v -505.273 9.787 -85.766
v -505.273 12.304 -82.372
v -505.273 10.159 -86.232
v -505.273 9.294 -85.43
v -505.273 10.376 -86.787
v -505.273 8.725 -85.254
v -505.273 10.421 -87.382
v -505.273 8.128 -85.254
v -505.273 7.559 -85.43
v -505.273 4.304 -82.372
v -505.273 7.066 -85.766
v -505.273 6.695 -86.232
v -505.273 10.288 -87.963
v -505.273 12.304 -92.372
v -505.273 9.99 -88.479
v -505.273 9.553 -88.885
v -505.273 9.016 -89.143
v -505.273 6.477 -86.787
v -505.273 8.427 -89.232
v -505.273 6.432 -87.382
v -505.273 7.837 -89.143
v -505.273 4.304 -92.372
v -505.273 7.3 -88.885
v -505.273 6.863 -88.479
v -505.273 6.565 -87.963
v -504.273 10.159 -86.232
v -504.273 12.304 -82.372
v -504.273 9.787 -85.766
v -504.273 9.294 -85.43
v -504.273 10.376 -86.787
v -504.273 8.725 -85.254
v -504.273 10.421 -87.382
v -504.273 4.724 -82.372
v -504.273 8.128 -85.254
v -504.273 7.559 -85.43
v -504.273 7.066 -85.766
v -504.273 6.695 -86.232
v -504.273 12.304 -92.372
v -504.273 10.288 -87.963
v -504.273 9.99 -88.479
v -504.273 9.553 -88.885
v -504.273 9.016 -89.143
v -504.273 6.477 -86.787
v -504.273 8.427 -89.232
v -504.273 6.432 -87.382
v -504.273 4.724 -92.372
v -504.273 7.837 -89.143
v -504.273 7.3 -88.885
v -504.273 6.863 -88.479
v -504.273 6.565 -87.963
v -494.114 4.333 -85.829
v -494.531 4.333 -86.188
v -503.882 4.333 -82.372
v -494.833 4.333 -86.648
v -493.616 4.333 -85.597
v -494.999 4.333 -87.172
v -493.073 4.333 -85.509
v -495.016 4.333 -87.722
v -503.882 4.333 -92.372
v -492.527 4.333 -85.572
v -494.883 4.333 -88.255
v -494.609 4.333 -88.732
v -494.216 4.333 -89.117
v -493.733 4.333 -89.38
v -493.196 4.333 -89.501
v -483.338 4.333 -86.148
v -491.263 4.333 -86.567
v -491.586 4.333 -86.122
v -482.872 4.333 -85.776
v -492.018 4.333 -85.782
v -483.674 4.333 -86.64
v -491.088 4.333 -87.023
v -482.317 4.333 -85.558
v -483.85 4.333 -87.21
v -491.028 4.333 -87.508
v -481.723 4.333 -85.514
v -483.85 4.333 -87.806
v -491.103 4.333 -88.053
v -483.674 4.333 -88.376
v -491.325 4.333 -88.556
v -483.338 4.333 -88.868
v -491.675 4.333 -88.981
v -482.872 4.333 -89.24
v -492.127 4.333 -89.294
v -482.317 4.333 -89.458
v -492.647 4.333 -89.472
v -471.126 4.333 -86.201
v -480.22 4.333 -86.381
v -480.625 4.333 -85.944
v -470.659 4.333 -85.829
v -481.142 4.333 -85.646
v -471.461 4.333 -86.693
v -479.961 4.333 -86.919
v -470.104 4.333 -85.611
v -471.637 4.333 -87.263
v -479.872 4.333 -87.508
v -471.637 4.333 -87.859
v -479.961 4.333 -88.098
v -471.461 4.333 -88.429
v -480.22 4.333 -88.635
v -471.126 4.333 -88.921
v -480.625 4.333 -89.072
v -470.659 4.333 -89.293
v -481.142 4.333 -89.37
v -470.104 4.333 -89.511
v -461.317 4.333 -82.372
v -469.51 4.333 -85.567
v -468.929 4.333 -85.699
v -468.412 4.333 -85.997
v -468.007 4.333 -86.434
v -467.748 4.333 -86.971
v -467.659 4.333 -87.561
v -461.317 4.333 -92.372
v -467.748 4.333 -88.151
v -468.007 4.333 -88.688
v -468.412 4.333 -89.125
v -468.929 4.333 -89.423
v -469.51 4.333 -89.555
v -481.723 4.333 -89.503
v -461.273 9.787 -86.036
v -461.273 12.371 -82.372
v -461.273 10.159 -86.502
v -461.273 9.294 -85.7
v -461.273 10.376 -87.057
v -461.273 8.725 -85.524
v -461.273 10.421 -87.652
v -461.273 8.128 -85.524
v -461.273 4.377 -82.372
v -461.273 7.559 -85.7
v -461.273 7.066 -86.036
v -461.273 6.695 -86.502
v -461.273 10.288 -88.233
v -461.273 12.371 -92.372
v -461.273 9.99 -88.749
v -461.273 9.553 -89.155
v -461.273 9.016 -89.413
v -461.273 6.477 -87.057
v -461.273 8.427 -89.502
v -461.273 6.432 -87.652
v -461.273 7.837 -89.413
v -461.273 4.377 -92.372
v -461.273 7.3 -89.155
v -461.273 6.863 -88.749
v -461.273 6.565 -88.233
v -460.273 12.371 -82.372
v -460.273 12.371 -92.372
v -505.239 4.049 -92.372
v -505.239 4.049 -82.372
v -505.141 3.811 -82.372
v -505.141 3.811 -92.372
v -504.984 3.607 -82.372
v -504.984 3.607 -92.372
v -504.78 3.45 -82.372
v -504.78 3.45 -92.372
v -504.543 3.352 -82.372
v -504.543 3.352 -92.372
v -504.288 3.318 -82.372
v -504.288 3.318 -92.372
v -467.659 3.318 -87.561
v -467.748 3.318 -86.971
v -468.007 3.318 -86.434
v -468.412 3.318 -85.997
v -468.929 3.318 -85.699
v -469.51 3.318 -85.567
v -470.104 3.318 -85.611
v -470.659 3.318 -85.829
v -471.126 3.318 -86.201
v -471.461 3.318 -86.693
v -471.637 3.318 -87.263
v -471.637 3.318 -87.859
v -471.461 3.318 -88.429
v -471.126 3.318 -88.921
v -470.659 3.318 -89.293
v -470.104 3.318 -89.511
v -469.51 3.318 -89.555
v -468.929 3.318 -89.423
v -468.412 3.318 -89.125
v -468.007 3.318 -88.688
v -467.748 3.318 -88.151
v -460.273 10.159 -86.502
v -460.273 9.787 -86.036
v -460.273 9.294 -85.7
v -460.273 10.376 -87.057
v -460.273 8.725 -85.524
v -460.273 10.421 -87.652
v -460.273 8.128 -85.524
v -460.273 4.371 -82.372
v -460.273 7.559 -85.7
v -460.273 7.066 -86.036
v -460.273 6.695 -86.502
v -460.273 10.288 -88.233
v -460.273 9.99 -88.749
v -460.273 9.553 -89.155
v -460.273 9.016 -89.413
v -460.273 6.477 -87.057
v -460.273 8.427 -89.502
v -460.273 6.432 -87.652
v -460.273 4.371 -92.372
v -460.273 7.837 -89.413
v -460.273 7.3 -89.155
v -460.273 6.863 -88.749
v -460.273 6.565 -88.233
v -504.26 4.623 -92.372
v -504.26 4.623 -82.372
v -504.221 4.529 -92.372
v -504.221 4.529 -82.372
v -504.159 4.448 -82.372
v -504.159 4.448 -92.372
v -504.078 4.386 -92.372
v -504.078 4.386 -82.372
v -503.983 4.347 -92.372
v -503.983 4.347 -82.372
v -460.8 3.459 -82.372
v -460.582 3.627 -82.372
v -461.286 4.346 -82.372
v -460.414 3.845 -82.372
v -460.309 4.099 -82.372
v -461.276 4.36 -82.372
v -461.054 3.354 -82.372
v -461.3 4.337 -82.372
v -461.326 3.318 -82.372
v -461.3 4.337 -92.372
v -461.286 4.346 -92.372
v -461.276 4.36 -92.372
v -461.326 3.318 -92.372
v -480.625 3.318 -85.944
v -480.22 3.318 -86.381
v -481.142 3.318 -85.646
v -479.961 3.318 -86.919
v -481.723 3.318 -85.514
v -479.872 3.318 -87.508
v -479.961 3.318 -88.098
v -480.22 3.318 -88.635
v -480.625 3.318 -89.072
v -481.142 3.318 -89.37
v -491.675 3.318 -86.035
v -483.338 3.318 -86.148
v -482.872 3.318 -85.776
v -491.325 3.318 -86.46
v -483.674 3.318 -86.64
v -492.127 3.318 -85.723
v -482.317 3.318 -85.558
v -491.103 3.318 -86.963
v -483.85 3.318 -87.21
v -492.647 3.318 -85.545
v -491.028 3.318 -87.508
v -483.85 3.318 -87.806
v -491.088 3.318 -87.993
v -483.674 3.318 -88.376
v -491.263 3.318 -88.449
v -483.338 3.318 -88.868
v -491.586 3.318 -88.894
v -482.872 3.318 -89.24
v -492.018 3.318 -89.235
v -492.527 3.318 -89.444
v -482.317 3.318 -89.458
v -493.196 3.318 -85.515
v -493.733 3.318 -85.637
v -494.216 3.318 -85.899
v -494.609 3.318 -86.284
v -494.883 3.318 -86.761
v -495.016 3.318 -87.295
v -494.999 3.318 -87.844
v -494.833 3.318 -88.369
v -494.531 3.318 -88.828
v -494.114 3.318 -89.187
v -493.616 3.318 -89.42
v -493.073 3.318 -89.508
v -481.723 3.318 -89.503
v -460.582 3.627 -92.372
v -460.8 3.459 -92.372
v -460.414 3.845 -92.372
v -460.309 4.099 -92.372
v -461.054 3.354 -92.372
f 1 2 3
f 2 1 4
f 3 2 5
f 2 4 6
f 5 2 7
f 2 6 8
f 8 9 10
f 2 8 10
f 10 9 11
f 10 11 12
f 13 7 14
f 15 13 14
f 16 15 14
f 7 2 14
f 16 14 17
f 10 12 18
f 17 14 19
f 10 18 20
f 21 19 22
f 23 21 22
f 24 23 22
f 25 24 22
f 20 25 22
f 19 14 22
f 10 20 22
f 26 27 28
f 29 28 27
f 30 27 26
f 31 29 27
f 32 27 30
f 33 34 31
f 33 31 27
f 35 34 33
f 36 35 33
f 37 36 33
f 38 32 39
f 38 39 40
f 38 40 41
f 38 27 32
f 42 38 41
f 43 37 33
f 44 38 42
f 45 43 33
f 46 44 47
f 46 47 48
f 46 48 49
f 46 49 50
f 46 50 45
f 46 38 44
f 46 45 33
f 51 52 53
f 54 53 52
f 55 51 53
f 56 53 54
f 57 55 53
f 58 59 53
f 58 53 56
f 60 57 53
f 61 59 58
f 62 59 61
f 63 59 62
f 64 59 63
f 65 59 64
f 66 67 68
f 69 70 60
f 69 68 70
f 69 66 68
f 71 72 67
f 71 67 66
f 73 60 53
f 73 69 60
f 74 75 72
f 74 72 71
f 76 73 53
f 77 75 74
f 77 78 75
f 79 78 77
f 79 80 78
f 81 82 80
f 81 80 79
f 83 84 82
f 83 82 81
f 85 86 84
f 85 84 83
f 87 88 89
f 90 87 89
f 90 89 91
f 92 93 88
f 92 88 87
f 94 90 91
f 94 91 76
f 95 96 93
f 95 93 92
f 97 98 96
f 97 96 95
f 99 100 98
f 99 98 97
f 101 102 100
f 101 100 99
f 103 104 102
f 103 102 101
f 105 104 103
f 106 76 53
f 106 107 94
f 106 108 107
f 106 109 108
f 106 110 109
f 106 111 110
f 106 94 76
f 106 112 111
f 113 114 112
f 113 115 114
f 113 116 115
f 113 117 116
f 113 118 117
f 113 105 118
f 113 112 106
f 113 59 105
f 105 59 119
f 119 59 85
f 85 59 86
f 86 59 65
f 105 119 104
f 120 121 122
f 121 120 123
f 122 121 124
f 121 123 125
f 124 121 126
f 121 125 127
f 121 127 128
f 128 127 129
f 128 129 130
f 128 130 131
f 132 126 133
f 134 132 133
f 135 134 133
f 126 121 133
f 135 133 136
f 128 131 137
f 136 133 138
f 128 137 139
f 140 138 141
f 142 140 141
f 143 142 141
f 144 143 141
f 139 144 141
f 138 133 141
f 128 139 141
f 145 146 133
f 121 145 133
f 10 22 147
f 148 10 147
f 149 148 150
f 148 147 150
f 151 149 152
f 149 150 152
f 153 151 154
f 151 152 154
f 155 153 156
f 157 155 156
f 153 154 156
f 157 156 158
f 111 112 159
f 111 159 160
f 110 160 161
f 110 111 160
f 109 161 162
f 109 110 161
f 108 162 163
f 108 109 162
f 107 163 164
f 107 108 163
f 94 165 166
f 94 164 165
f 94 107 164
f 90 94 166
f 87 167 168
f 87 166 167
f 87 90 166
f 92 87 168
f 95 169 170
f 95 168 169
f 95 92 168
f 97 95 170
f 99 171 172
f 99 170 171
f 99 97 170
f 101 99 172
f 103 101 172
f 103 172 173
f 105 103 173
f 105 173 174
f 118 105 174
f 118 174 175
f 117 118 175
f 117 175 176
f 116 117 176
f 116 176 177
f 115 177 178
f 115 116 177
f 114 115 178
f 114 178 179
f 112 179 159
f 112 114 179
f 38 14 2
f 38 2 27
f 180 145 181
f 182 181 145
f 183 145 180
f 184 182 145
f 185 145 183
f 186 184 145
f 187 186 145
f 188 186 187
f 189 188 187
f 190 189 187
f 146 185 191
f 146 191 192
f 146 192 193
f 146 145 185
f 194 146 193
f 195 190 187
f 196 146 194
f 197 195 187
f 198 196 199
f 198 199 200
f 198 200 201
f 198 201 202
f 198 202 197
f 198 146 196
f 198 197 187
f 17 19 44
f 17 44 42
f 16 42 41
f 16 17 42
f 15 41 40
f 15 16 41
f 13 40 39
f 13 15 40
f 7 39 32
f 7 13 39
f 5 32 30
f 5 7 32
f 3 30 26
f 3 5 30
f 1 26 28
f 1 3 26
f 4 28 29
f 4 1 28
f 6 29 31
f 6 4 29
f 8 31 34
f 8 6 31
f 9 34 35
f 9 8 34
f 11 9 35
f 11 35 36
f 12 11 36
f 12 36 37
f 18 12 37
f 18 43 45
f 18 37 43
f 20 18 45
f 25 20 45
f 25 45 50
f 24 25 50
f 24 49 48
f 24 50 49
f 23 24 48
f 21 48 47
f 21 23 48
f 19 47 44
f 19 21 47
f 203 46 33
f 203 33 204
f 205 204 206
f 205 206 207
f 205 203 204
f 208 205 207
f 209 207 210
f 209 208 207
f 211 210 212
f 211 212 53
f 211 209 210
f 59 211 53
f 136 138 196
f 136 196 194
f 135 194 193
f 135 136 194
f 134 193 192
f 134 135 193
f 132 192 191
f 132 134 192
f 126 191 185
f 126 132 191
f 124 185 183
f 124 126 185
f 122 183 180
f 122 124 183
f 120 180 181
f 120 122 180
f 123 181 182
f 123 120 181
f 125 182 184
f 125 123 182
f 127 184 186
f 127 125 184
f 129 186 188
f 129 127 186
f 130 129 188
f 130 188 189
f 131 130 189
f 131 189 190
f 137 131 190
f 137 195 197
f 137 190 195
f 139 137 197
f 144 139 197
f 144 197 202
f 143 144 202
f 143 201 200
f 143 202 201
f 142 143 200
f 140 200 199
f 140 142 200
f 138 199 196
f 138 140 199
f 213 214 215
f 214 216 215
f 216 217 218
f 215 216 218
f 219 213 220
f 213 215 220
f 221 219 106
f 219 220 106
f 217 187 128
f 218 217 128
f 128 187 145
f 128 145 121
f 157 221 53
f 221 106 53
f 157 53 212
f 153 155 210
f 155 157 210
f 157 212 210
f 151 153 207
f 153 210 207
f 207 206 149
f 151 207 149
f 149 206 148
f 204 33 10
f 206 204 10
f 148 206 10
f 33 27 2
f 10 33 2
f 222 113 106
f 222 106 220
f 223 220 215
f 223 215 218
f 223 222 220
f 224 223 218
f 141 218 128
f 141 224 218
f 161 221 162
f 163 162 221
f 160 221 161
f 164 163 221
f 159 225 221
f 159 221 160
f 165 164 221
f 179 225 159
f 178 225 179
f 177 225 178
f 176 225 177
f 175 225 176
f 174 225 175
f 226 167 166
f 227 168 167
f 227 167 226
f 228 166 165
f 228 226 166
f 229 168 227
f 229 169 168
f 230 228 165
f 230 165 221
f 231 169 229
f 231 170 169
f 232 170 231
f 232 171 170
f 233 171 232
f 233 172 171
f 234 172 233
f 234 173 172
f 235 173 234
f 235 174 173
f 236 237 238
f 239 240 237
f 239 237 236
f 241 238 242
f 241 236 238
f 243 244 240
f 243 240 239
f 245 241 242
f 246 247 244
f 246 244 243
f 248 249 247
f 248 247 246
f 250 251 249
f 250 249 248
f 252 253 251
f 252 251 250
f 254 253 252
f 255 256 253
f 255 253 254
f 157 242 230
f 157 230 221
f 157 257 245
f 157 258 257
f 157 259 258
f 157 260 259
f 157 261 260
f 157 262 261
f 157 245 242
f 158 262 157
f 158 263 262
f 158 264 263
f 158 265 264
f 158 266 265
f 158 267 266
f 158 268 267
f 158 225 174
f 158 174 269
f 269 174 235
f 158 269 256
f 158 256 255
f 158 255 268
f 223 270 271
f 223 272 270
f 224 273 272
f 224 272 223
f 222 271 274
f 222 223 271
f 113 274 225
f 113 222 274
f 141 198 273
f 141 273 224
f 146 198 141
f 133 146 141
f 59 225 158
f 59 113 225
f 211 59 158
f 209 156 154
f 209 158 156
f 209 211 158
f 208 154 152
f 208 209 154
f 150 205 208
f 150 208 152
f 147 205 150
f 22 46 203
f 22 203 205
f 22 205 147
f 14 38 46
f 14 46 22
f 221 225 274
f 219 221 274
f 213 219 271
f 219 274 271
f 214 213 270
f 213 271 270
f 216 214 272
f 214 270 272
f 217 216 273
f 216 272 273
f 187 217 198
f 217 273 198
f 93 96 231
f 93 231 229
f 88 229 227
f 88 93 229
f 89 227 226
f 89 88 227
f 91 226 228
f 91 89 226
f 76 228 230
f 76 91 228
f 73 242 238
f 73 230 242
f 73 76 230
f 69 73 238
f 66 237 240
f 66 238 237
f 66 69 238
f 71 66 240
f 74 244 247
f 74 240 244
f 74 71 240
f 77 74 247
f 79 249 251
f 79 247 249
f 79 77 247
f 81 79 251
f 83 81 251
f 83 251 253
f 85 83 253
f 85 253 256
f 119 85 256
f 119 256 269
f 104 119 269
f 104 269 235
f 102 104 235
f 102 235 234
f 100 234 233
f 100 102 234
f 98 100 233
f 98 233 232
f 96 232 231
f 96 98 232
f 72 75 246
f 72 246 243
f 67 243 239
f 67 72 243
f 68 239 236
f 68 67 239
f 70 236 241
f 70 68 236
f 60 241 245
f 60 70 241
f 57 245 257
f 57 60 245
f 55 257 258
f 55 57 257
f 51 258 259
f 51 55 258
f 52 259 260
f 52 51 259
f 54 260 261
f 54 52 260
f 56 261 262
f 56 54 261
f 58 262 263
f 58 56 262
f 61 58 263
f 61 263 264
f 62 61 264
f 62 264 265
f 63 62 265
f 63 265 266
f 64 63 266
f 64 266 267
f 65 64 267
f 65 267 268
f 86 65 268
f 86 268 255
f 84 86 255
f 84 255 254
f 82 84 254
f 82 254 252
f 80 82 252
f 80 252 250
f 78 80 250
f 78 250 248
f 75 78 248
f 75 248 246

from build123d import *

# Parameters (mm, degrees)
CYLINDER030_R               = 2
CYLINDER030_DEPTH           = 10
CYLINDER030_PITCH_ANGLE     = 90
CYLINDER030_PLACEMENT_ANGLE = 7e-06
CYLINDER031_R               = 2
CYLINDER031_DEPTH           = 10
CYLINDER031_PITCH_ANGLE     = 90
CYLINDER031_PLACEMENT_ANGLE = 7e-06
CYLINDER026_R               = 2
CYLINDER026_DEPTH           = 2
CYLINDER026_ROLL_ANGLE      = -88.507054
CYLINDER026_PITCH_ANGLE     = -87.01751
CYLINDER026_PLACEMENT_ANGLE = -92.244015
CYLINDER028_R               = 2
CYLINDER028_DEPTH           = 2
CYLINDER028_PLACEMENT_ANGLE = 90.00001
CYLINDER029_R               = 2
CYLINDER029_DEPTH           = 2
CYLINDER029_ROLL_ANGLE      = 90
CYLINDER027_R               = 2
CYLINDER027_DEPTH           = 2
CYLINDER027_ROLL_ANGLE      = 90
CYLINDER025_R               = 2
CYLINDER025_DEPTH           = 2
CYLINDER025_ROLL_ANGLE      = -88.507054
CYLINDER025_PITCH_ANGLE     = -87.01751
CYLINDER025_PLACEMENT_ANGLE = -92.244015
PAD006_DEPTH                = 10


with BuildPart() as cylinder030:
    # Cylinder030 → Cylinder030 (new body)
    with BuildSketch(Plane.XY):
        Circle(CYLINDER030_R)
    extrude(amount=CYLINDER030_DEPTH)


with BuildPart() as cylinder030_1:
    # Cylinder030 pitch: moved
    add(cylinder030.part.rotate(Axis((0, 0, 0), (0, 1, 0)), CYLINDER030_PITCH_ANGLE))


with BuildPart() as cylinder030_2:
    # Cylinder030 placement: moved
    add(cylinder030_1.part.moved(Location((15.49, 3.9, 4.87))).rotate(Axis((15.49, 3.9, 4.87), (0, 0, 1)), CYLINDER030_PLACEMENT_ANGLE))


with BuildPart() as cylinder031:
    # Cylinder031 → Cylinder031 (new body)
    with BuildSketch(Plane.XY):
        Circle(CYLINDER031_R)
    extrude(amount=CYLINDER031_DEPTH)


with BuildPart() as cylinder031_1:
    # Cylinder031 pitch: moved
    add(cylinder031.part.rotate(Axis((0, 0, 0), (0, 1, 0)), CYLINDER031_PITCH_ANGLE))


with BuildPart() as cylinder031_2:
    # Cylinder031 placement: moved
    add(cylinder031_1.part.moved(Location((-28.4147, 3.9, 5.14))).rotate(Axis((-28.4147, 3.9, 5.14), (0, 0, 1)), CYLINDER031_PLACEMENT_ANGLE))


with BuildPart() as cylinder026:
    # Cylinder026 → Cylinder026 (new body)
    with BuildSketch(Plane.XY):
        Circle(CYLINDER026_R)
    extrude(amount=CYLINDER026_DEPTH)


with BuildPart() as cylinder026_1:
    # Cylinder026 roll: moved
    add(cylinder026.part.rotate(Axis((0, 0, 0), (1, 0, 0)), CYLINDER026_ROLL_ANGLE))


with BuildPart() as cylinder026_2:
    # Cylinder026 pitch: moved
    add(cylinder026_1.part.rotate(Axis((0, 0, 0), (0, 1, 0)), CYLINDER026_PITCH_ANGLE))


with BuildPart() as cylinder026_3:
    # Cylinder026 placement: moved
    add(cylinder026_2.part.moved(Location((-26, 5.29, 4.9))).rotate(Axis((-26, 5.29, 4.9), (0, 0, 1)), CYLINDER026_PLACEMENT_ANGLE))


with BuildPart() as cylinder028:
    # Cylinder028 → Cylinder028 (new body)
    with BuildSketch(Plane.XY):
        Circle(CYLINDER028_R)
    extrude(amount=CYLINDER028_DEPTH)


with BuildPart() as cylinder028_1:
    # Cylinder028 placement: moved
    add(cylinder028.part.moved(Location((-11.1555, 0, 4.86401))).rotate(Axis((-11.1555, 0, 4.86401), (1, 0, 0)), CYLINDER028_PLACEMENT_ANGLE))


with BuildPart() as cylinder029:
    # Cylinder029 → Cylinder029 (new body)
    with BuildSketch(Plane.XY):
        Circle(CYLINDER029_R)
    extrude(amount=CYLINDER029_DEPTH)


with BuildPart() as cylinder029_1:
    # Cylinder029 roll: moved
    add(cylinder029.part.rotate(Axis((0, 0, 0), (1, 0, 0)), CYLINDER029_ROLL_ANGLE))


with BuildPart() as cylinder029_2:
    # Cylinder029 placement: moved
    add(cylinder029_1.part.moved(Location((0, 0, 4.86401))))


with BuildPart() as cylinder027:
    # Cylinder027 → Cylinder027 (new body)
    with BuildSketch(Plane.XY):
        Circle(CYLINDER027_R)
    extrude(amount=CYLINDER027_DEPTH)


with BuildPart() as cylinder027_1:
    # Cylinder027 roll: moved
    add(cylinder027.part.rotate(Axis((0, 0, 0), (1, 0, 0)), CYLINDER027_ROLL_ANGLE))


with BuildPart() as cylinder027_2:
    # Cylinder027 placement: moved
    add(cylinder027_1.part.moved(Location((12.2129, 0, 4.81114))))


with BuildPart() as cylinder025:
    # Cylinder025 → Cylinder025 (new body)
    with BuildSketch(Plane.XY):
        Circle(CYLINDER025_R)
    extrude(amount=CYLINDER025_DEPTH)


with BuildPart() as cylinder025_1:
    # Cylinder025 roll: moved
    add(cylinder025.part.rotate(Axis((0, 0, 0), (1, 0, 0)), CYLINDER025_ROLL_ANGLE))


with BuildPart() as cylinder025_2:
    # Cylinder025 pitch: moved
    add(cylinder025_1.part.rotate(Axis((0, 0, 0), (0, 1, 0)), CYLINDER025_PITCH_ANGLE))


with BuildPart() as cylinder025_3:
    # Cylinder025 placement: moved
    add(cylinder025_2.part.moved(Location((25, 5.38, 4.9))).rotate(Axis((25, 5.38, 4.9), (0, 0, 1)), CYLINDER025_PLACEMENT_ANGLE))


with BuildPart() as cut019:
    # Sketch007 → Pad006 (new body)
    with BuildSketch(Plane.XY):
        with BuildLine():
            Line((20.546084, -1.208272), (-22.415471, -1.208272))
            ThreePointArc((-23.400725, -0.223018), (-23.112151, -0.919698), (-22.415471, -1.208272))
            Line((-23.400725, 7.776982), (-23.400725, -0.223018))
            Line((-23.400725, 7.776982), (-22.400725, 7.776982))
            Line((-22.400725, 7.776982), (-22.400725, 0.197829))
            ThreePointArc((-22.400725, 0.197829), (-22.286166, -0.07874), (-22.009596, -0.193299))
            Line((-22.009596, -0.193299), (20.555186, -0.193299))
            ThreePointArc((20.555186, -0.193299), (20.586324, -0.180401), (20.599222, -0.149263))
            Line((20.599222, 7.844865), (20.599222, -0.149263))
            Line((21.599222, 7.844865), (20.599222, 7.844865))
            Line((21.599222, 7.844865), (21.599222, -0.155135))
            ThreePointArc((20.546084, -1.208272), (21.290765, -0.899815), (21.599222, -0.155135))
        make_face()
    extrude(amount=PAD006_DEPTH)

    # Cut005: cut Cylinder025
    add(cylinder025_3.part, mode=Mode.SUBTRACT)

    # Cut006: cut Cylinder027
    add(cylinder027_2.part, mode=Mode.SUBTRACT)

    # Cut007: cut Cylinder029
    add(cylinder029_2.part, mode=Mode.SUBTRACT)

    # Cut008: cut Cylinder028
    add(cylinder028_1.part, mode=Mode.SUBTRACT)

    # Cut009: cut Cylinder026
    add(cylinder026_3.part, mode=Mode.SUBTRACT)

    # Cut018: cut Cylinder031
    add(cylinder031_2.part, mode=Mode.SUBTRACT)

    # Cut019: cut Cylinder030
    add(cylinder030_2.part, mode=Mode.SUBTRACT)


with BuildPart() as cut019_1:
    # Cut019 placement: moved
    add(cut019.part.moved(Location((-481.872341, 4.526565, -92.372143))))


solid = cut019_1.part
